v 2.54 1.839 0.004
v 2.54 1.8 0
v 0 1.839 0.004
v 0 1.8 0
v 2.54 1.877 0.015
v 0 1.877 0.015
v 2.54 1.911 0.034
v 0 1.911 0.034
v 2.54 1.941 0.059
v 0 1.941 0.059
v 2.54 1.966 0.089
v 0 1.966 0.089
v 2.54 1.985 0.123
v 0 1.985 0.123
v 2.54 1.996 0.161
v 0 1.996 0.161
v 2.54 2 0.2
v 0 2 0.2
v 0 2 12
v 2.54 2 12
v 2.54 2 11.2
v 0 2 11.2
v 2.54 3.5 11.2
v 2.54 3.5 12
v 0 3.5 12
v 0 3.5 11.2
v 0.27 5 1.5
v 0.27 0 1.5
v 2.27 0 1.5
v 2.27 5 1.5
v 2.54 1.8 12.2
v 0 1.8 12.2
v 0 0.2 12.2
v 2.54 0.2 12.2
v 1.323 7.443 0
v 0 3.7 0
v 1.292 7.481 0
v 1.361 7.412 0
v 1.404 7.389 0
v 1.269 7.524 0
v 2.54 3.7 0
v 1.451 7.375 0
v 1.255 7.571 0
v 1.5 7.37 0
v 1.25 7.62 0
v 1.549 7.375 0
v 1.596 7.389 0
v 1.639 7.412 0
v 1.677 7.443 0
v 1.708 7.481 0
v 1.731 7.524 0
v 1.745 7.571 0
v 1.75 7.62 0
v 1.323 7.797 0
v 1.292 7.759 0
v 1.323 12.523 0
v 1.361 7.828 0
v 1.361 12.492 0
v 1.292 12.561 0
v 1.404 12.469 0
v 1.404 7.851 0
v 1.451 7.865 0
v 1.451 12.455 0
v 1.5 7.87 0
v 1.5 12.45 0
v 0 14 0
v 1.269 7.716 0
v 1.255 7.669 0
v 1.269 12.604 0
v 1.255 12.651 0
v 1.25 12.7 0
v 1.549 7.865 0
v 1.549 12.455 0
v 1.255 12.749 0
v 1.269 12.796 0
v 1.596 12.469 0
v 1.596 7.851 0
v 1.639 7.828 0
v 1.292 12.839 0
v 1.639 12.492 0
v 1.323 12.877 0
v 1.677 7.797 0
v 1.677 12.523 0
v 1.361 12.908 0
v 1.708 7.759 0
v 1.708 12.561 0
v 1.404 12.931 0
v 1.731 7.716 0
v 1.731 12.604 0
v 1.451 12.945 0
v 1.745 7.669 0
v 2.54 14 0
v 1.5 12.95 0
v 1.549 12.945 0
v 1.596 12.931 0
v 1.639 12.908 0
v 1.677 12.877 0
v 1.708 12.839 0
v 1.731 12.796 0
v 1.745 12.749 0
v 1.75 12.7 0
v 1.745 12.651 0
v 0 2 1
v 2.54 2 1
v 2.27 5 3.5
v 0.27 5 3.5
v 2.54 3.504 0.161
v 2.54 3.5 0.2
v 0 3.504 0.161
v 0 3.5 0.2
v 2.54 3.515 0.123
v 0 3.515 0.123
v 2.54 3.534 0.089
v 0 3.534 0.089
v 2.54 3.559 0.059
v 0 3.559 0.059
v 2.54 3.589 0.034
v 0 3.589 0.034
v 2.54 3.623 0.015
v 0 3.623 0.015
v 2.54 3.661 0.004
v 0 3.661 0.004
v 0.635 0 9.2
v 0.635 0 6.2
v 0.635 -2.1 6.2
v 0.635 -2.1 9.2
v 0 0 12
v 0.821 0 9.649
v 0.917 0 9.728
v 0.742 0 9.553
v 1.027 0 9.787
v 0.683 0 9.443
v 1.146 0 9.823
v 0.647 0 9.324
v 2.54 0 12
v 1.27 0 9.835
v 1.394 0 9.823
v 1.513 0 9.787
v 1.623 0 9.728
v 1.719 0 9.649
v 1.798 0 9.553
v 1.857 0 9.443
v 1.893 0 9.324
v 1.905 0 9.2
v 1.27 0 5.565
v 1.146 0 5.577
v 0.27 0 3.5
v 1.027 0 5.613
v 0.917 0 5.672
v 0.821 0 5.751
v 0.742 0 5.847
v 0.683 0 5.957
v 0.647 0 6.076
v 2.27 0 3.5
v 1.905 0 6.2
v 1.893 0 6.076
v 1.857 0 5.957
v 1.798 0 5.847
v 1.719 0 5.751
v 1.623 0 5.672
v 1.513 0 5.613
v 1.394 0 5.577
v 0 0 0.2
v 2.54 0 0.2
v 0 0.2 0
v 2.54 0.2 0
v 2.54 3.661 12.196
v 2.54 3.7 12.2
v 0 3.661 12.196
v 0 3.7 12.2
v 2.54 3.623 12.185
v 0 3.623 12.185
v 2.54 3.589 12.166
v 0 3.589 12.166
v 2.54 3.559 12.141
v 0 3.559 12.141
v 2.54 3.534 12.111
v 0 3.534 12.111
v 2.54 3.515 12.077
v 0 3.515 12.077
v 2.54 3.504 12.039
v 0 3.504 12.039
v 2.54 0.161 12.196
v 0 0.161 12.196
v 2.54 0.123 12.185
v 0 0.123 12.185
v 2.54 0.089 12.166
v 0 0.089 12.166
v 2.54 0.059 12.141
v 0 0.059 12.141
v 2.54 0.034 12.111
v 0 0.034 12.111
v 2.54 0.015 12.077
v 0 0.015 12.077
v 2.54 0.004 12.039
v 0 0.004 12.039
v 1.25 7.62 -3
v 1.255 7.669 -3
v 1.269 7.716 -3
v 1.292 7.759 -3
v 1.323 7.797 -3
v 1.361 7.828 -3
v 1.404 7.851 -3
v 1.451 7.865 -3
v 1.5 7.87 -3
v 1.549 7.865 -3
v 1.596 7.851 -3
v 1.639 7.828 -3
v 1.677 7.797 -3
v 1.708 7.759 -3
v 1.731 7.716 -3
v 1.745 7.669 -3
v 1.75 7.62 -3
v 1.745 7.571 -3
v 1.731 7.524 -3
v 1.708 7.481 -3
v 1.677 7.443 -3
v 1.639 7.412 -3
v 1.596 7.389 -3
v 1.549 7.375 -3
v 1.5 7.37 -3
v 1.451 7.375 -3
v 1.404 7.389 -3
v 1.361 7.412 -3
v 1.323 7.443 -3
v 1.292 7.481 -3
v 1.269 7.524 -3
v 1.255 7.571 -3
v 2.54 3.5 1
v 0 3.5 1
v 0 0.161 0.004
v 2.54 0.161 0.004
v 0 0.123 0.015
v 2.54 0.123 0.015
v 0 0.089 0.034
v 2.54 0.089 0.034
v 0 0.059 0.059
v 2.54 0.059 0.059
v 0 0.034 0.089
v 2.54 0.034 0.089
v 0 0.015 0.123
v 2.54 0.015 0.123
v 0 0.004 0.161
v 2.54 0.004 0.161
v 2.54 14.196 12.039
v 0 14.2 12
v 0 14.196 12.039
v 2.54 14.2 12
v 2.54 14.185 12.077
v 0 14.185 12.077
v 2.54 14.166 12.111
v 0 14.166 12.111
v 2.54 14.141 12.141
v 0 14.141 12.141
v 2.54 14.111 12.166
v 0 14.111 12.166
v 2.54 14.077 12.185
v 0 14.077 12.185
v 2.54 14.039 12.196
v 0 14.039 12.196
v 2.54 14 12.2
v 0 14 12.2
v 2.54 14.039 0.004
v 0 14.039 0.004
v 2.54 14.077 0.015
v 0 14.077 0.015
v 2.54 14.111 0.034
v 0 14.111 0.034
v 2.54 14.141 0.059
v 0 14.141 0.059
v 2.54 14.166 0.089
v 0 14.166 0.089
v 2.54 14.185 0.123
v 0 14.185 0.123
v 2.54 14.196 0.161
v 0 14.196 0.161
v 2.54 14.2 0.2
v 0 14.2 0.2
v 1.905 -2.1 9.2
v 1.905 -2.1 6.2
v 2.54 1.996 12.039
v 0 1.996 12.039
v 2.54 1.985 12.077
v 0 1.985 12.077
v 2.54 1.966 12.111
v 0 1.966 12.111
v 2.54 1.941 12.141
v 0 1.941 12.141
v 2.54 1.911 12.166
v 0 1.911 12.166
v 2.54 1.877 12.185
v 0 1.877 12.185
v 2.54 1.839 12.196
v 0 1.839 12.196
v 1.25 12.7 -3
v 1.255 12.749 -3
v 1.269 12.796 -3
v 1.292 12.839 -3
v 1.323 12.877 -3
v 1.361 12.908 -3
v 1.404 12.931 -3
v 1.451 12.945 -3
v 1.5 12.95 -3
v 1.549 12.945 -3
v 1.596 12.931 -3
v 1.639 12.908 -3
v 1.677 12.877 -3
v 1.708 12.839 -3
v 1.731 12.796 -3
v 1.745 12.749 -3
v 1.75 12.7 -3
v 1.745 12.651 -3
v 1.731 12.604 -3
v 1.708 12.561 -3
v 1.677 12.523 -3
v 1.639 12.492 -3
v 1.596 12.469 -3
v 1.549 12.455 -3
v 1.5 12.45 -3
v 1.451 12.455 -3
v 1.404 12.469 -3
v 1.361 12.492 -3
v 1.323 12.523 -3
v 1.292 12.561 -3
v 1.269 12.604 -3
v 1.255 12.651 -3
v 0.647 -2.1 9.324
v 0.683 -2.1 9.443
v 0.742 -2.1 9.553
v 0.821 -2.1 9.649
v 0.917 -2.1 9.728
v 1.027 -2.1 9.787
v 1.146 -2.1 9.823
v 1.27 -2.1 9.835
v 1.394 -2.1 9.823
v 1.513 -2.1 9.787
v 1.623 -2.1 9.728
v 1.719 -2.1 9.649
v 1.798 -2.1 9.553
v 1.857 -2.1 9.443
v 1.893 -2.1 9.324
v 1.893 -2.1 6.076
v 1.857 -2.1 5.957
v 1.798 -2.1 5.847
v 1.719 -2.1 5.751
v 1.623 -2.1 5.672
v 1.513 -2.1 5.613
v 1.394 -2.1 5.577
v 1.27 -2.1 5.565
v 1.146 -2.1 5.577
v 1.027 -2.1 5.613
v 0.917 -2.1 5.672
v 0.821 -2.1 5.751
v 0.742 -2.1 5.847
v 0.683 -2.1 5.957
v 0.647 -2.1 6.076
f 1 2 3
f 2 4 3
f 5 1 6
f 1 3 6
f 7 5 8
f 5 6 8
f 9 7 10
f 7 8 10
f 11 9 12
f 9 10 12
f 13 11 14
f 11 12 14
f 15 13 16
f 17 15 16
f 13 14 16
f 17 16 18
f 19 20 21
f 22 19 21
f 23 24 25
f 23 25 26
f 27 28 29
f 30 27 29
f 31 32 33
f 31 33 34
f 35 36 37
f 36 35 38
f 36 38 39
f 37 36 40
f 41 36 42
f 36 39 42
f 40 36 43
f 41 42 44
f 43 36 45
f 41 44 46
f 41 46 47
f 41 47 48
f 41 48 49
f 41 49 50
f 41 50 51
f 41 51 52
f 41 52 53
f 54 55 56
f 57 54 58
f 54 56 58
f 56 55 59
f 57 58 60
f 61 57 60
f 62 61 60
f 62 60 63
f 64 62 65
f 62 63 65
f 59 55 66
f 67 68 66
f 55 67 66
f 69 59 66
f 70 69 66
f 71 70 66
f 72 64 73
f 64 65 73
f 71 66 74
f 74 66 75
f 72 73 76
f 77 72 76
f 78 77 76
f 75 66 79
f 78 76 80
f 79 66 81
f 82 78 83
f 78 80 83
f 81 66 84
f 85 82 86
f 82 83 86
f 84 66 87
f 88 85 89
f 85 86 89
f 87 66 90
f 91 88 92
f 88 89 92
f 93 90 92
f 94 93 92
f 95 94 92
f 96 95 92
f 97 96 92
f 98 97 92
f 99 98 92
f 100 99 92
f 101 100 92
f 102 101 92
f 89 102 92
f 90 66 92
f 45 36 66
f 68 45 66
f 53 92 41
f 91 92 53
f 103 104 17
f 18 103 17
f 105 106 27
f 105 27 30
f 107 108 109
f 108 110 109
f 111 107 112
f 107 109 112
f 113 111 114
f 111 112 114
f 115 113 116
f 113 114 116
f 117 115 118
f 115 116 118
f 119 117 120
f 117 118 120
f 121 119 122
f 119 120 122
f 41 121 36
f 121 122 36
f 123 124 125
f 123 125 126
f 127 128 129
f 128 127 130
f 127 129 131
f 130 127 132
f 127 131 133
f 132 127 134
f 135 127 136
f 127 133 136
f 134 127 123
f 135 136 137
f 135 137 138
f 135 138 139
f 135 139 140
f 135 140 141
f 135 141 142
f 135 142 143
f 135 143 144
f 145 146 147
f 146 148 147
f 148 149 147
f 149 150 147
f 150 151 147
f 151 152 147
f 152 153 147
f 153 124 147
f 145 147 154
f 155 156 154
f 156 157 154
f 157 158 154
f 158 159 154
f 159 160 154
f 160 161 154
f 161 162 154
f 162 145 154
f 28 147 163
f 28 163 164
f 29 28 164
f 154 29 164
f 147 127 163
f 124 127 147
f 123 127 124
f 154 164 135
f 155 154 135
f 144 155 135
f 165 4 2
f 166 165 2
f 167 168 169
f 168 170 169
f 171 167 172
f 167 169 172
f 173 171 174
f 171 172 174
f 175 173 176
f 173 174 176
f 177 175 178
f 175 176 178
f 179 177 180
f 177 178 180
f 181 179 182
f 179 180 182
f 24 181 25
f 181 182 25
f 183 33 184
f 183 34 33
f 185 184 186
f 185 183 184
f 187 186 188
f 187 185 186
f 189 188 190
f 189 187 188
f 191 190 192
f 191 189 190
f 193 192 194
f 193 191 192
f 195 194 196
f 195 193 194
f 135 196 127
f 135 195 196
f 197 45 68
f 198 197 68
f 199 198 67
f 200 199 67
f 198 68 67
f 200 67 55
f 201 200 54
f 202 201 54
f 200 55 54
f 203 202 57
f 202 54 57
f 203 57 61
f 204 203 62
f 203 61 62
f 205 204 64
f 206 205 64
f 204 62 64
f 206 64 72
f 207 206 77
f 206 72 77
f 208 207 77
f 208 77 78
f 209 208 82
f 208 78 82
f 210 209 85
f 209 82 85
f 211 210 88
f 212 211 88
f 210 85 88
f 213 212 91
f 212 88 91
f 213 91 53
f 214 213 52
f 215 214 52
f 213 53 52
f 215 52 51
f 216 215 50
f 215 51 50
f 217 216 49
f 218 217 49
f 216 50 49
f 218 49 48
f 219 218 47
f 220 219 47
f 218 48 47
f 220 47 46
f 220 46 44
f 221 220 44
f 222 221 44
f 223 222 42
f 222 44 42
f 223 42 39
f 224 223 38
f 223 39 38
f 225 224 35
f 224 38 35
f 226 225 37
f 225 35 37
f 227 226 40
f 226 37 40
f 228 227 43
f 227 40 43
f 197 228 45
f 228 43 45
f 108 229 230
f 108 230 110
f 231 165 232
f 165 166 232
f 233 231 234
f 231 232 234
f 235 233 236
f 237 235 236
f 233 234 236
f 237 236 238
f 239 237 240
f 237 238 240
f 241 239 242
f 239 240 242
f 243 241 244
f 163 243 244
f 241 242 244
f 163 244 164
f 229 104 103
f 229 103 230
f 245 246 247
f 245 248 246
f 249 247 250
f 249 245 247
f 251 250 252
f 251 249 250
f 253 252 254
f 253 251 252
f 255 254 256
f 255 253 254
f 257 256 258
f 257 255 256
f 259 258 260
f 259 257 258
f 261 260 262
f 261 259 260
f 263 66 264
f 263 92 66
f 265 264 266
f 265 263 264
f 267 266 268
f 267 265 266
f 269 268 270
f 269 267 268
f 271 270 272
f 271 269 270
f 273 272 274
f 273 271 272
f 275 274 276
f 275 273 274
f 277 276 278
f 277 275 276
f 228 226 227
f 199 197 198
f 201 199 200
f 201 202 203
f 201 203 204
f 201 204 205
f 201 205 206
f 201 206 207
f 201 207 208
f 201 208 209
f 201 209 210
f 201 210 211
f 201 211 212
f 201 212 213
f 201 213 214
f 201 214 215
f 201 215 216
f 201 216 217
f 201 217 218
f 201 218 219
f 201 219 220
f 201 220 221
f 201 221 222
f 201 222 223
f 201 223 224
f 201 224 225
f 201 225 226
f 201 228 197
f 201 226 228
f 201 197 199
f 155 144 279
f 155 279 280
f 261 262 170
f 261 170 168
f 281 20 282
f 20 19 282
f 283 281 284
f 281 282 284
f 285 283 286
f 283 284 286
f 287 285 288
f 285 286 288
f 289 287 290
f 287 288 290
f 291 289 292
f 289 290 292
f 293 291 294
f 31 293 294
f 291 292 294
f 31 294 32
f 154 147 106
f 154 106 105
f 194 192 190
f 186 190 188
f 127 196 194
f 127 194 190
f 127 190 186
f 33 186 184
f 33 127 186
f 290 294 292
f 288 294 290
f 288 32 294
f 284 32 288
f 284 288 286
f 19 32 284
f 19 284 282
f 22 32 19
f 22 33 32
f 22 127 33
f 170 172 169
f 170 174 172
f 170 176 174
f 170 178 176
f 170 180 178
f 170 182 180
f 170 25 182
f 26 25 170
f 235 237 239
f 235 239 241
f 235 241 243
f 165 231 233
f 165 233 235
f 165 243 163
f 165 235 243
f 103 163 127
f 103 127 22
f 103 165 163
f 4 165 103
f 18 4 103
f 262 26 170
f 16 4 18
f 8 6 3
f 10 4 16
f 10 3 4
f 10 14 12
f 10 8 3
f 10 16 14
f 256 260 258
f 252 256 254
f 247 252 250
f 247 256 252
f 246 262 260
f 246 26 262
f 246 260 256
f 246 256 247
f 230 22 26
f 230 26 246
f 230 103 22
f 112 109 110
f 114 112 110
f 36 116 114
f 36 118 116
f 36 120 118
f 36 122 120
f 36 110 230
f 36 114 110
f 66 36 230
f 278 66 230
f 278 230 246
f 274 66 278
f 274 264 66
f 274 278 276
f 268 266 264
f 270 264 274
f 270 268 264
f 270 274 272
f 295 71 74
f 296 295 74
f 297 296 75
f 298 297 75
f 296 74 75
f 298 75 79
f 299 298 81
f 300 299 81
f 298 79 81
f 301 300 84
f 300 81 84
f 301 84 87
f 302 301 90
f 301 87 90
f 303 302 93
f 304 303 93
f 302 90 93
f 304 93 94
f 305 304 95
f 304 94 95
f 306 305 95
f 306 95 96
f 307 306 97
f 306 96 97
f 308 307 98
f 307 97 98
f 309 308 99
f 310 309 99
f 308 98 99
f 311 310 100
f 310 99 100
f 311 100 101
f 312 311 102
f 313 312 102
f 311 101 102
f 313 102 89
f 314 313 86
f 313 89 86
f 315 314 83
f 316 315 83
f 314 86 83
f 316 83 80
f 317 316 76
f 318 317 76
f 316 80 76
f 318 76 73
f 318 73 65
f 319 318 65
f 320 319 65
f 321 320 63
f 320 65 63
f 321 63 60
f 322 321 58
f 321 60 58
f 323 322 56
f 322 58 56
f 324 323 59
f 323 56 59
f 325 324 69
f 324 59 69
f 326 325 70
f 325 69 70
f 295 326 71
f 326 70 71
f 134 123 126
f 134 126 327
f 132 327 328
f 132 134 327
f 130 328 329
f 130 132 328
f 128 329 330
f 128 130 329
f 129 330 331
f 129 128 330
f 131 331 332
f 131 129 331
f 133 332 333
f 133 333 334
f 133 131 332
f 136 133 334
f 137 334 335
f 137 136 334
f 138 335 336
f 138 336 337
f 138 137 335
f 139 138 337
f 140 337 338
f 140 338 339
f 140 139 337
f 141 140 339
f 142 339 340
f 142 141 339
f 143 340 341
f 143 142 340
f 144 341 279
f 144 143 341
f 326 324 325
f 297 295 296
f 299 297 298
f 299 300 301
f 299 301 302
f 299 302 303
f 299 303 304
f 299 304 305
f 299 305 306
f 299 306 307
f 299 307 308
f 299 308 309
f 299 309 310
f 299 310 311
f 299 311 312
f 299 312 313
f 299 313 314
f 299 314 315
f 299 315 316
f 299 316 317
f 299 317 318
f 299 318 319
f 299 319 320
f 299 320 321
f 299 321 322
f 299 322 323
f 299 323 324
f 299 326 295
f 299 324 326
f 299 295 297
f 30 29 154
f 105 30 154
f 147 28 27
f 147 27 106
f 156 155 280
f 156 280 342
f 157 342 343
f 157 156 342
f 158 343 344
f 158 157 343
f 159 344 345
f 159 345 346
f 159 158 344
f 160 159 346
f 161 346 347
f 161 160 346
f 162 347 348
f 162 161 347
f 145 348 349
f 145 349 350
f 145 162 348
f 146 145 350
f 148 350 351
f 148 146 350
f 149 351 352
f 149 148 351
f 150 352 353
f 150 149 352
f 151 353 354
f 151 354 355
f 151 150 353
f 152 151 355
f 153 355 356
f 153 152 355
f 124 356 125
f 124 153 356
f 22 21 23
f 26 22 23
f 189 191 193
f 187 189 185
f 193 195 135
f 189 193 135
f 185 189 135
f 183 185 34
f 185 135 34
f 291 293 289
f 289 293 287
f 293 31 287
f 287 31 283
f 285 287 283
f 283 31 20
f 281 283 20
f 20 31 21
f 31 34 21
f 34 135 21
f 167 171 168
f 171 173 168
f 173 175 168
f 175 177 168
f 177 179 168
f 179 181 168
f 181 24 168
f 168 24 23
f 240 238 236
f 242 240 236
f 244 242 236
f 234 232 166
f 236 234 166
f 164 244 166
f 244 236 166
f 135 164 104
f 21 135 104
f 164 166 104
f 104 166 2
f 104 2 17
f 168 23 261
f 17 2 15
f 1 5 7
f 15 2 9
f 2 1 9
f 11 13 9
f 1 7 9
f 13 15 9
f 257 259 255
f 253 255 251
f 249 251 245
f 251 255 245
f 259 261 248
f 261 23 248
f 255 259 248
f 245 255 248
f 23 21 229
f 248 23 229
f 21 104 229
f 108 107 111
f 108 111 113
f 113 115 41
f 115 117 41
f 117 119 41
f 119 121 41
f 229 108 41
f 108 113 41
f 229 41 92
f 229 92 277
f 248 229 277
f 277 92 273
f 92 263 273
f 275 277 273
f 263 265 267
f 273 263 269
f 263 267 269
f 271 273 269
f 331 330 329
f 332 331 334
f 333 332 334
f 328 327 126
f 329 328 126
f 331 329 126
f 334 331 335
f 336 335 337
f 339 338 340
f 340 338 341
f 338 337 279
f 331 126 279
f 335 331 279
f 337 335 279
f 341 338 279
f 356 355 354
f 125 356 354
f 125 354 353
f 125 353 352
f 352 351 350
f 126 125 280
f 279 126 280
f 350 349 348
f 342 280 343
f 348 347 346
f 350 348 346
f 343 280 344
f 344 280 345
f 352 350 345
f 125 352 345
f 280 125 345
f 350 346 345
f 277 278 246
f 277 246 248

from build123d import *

# Parameters (mm, degrees)
SKETCH_1_W          = 2.54
SKETCH_1_H          = 14.2
EXTRUDE_1_DEPTH     = 12.2
SKETCH_2_R          = 0.25
EXTRUDE_2_DEPTH     = 3
EXTRUDE_3_DEPTH     = 2.1
SKETCH_4_W          = 2
SKETCH_4_H          = 2
CUT_EXTRUDE_1_DEPTH = 5
CUT_EXTRUDE_2_REACH = 20.893
SKETCH_5_W          = 2.597491907
SKETCH_5_H          = 1.5
SKETCH_5_W_2        = 2.655260115
FILLET_1_R          = 0.2


with BuildPart() as part:
    # 草图1 → 凸台-拉伸1 (new body)
    with BuildSketch(Plane.XY):
        with Locations((1.27, 7.1)):
            Rectangle(SKETCH_1_W, SKETCH_1_H)
    extrude(amount=EXTRUDE_1_DEPTH)

    # 草图2 → 凸台-拉伸2 (add)
    with BuildSketch(Plane(origin=(0, 0, 0), x_dir=(-1, 0, 0), z_dir=(0, 0, -1))):
        with Locations((-1.5, 12.7)):
            Circle(SKETCH_2_R)
        with Locations((-1.5, 7.62)):
            Circle(SKETCH_2_R)
    extrude(amount=EXTRUDE_2_DEPTH)

    # 草图3 → 凸台-拉伸3 (add)
    with BuildSketch(Plane(origin=(0, 0, 0), x_dir=(-1, 0, 0), z_dir=(0, -1, 0))):
        with BuildLine():
            Line((-1.905, -9.2), (-1.905, -6.2))
            ThreePointArc((-1.905, -6.2), (-1.27, -5.565), (-0.635, -6.2))
            Line((-0.635, -6.2), (-0.635, -9.2))
            ThreePointArc((-0.635, -9.2), (-1.27, -9.835), (-1.905, -9.2))
        make_face()
    extrude(amount=EXTRUDE_3_DEPTH)

    # 草图4 → 切除-拉伸1 (cut)
    with BuildSketch(Plane.XZ):
        with Locations((1.27, 2.5)):
            Rectangle(SKETCH_4_W, SKETCH_4_H)
    extrude(amount=-CUT_EXTRUDE_1_DEPTH, mode=Mode.SUBTRACT)

    # 草图5 → 切除-拉伸2 (cut, up to next)
    with BuildSketch(Plane(origin=(2.54, 0, 0), x_dir=(0, 0, -1), z_dir=(1, 0, 0)), mode=Mode.PRIVATE) as cut_extrude_2_sk1:
        with Locations((-12.498745954, 2.75)):
            Rectangle(SKETCH_5_W, SKETCH_5_H)
    cut_extrude_2_tool1 = extrude(cut_extrude_2_sk1.sketch, amount=-CUT_EXTRUDE_2_REACH, mode=Mode.PRIVATE) & part.part
    # 草图5 → 切除-拉伸2 (cut, up to next)
    with BuildSketch(Plane(origin=(2.54, 0, 0), x_dir=(0, 0, -1), z_dir=(1, 0, 0)), mode=Mode.PRIVATE) as cut_extrude_2_sk2:
        with Locations((0.327630058, 2.75)):
            Rectangle(SKETCH_5_W_2, SKETCH_5_H)
    cut_extrude_2_tool2 = extrude(cut_extrude_2_sk2.sketch, amount=-CUT_EXTRUDE_2_REACH, mode=Mode.PRIVATE) & part.part
    add(cut_extrude_2_tool1.solids().sort_by_distance((2.54, 2.75, 12.498746))[0], mode=Mode.SUBTRACT)
    add(cut_extrude_2_tool2.solids().sort_by_distance((2.54, 2.75, -0.32763))[0], mode=Mode.SUBTRACT)

    # 圆角1
    fillet_1_edges = [part.edges().sort_by_distance(p)[0] for p in [
        (1.27, 14.2, 12.2),
        (1.27, 14.2, 0),
        (1.27, 0, 0),
        (1.27, 3.5, 12.2),
        (1.27, 2, 12.2),
        (1.27, 3.5, 0),
        (1.27, 2, 0),
        (1.27, 0, 12.2),
    ]]
    fillet(fillet_1_edges, radius=FILLET_1_R)


solid = part.part
